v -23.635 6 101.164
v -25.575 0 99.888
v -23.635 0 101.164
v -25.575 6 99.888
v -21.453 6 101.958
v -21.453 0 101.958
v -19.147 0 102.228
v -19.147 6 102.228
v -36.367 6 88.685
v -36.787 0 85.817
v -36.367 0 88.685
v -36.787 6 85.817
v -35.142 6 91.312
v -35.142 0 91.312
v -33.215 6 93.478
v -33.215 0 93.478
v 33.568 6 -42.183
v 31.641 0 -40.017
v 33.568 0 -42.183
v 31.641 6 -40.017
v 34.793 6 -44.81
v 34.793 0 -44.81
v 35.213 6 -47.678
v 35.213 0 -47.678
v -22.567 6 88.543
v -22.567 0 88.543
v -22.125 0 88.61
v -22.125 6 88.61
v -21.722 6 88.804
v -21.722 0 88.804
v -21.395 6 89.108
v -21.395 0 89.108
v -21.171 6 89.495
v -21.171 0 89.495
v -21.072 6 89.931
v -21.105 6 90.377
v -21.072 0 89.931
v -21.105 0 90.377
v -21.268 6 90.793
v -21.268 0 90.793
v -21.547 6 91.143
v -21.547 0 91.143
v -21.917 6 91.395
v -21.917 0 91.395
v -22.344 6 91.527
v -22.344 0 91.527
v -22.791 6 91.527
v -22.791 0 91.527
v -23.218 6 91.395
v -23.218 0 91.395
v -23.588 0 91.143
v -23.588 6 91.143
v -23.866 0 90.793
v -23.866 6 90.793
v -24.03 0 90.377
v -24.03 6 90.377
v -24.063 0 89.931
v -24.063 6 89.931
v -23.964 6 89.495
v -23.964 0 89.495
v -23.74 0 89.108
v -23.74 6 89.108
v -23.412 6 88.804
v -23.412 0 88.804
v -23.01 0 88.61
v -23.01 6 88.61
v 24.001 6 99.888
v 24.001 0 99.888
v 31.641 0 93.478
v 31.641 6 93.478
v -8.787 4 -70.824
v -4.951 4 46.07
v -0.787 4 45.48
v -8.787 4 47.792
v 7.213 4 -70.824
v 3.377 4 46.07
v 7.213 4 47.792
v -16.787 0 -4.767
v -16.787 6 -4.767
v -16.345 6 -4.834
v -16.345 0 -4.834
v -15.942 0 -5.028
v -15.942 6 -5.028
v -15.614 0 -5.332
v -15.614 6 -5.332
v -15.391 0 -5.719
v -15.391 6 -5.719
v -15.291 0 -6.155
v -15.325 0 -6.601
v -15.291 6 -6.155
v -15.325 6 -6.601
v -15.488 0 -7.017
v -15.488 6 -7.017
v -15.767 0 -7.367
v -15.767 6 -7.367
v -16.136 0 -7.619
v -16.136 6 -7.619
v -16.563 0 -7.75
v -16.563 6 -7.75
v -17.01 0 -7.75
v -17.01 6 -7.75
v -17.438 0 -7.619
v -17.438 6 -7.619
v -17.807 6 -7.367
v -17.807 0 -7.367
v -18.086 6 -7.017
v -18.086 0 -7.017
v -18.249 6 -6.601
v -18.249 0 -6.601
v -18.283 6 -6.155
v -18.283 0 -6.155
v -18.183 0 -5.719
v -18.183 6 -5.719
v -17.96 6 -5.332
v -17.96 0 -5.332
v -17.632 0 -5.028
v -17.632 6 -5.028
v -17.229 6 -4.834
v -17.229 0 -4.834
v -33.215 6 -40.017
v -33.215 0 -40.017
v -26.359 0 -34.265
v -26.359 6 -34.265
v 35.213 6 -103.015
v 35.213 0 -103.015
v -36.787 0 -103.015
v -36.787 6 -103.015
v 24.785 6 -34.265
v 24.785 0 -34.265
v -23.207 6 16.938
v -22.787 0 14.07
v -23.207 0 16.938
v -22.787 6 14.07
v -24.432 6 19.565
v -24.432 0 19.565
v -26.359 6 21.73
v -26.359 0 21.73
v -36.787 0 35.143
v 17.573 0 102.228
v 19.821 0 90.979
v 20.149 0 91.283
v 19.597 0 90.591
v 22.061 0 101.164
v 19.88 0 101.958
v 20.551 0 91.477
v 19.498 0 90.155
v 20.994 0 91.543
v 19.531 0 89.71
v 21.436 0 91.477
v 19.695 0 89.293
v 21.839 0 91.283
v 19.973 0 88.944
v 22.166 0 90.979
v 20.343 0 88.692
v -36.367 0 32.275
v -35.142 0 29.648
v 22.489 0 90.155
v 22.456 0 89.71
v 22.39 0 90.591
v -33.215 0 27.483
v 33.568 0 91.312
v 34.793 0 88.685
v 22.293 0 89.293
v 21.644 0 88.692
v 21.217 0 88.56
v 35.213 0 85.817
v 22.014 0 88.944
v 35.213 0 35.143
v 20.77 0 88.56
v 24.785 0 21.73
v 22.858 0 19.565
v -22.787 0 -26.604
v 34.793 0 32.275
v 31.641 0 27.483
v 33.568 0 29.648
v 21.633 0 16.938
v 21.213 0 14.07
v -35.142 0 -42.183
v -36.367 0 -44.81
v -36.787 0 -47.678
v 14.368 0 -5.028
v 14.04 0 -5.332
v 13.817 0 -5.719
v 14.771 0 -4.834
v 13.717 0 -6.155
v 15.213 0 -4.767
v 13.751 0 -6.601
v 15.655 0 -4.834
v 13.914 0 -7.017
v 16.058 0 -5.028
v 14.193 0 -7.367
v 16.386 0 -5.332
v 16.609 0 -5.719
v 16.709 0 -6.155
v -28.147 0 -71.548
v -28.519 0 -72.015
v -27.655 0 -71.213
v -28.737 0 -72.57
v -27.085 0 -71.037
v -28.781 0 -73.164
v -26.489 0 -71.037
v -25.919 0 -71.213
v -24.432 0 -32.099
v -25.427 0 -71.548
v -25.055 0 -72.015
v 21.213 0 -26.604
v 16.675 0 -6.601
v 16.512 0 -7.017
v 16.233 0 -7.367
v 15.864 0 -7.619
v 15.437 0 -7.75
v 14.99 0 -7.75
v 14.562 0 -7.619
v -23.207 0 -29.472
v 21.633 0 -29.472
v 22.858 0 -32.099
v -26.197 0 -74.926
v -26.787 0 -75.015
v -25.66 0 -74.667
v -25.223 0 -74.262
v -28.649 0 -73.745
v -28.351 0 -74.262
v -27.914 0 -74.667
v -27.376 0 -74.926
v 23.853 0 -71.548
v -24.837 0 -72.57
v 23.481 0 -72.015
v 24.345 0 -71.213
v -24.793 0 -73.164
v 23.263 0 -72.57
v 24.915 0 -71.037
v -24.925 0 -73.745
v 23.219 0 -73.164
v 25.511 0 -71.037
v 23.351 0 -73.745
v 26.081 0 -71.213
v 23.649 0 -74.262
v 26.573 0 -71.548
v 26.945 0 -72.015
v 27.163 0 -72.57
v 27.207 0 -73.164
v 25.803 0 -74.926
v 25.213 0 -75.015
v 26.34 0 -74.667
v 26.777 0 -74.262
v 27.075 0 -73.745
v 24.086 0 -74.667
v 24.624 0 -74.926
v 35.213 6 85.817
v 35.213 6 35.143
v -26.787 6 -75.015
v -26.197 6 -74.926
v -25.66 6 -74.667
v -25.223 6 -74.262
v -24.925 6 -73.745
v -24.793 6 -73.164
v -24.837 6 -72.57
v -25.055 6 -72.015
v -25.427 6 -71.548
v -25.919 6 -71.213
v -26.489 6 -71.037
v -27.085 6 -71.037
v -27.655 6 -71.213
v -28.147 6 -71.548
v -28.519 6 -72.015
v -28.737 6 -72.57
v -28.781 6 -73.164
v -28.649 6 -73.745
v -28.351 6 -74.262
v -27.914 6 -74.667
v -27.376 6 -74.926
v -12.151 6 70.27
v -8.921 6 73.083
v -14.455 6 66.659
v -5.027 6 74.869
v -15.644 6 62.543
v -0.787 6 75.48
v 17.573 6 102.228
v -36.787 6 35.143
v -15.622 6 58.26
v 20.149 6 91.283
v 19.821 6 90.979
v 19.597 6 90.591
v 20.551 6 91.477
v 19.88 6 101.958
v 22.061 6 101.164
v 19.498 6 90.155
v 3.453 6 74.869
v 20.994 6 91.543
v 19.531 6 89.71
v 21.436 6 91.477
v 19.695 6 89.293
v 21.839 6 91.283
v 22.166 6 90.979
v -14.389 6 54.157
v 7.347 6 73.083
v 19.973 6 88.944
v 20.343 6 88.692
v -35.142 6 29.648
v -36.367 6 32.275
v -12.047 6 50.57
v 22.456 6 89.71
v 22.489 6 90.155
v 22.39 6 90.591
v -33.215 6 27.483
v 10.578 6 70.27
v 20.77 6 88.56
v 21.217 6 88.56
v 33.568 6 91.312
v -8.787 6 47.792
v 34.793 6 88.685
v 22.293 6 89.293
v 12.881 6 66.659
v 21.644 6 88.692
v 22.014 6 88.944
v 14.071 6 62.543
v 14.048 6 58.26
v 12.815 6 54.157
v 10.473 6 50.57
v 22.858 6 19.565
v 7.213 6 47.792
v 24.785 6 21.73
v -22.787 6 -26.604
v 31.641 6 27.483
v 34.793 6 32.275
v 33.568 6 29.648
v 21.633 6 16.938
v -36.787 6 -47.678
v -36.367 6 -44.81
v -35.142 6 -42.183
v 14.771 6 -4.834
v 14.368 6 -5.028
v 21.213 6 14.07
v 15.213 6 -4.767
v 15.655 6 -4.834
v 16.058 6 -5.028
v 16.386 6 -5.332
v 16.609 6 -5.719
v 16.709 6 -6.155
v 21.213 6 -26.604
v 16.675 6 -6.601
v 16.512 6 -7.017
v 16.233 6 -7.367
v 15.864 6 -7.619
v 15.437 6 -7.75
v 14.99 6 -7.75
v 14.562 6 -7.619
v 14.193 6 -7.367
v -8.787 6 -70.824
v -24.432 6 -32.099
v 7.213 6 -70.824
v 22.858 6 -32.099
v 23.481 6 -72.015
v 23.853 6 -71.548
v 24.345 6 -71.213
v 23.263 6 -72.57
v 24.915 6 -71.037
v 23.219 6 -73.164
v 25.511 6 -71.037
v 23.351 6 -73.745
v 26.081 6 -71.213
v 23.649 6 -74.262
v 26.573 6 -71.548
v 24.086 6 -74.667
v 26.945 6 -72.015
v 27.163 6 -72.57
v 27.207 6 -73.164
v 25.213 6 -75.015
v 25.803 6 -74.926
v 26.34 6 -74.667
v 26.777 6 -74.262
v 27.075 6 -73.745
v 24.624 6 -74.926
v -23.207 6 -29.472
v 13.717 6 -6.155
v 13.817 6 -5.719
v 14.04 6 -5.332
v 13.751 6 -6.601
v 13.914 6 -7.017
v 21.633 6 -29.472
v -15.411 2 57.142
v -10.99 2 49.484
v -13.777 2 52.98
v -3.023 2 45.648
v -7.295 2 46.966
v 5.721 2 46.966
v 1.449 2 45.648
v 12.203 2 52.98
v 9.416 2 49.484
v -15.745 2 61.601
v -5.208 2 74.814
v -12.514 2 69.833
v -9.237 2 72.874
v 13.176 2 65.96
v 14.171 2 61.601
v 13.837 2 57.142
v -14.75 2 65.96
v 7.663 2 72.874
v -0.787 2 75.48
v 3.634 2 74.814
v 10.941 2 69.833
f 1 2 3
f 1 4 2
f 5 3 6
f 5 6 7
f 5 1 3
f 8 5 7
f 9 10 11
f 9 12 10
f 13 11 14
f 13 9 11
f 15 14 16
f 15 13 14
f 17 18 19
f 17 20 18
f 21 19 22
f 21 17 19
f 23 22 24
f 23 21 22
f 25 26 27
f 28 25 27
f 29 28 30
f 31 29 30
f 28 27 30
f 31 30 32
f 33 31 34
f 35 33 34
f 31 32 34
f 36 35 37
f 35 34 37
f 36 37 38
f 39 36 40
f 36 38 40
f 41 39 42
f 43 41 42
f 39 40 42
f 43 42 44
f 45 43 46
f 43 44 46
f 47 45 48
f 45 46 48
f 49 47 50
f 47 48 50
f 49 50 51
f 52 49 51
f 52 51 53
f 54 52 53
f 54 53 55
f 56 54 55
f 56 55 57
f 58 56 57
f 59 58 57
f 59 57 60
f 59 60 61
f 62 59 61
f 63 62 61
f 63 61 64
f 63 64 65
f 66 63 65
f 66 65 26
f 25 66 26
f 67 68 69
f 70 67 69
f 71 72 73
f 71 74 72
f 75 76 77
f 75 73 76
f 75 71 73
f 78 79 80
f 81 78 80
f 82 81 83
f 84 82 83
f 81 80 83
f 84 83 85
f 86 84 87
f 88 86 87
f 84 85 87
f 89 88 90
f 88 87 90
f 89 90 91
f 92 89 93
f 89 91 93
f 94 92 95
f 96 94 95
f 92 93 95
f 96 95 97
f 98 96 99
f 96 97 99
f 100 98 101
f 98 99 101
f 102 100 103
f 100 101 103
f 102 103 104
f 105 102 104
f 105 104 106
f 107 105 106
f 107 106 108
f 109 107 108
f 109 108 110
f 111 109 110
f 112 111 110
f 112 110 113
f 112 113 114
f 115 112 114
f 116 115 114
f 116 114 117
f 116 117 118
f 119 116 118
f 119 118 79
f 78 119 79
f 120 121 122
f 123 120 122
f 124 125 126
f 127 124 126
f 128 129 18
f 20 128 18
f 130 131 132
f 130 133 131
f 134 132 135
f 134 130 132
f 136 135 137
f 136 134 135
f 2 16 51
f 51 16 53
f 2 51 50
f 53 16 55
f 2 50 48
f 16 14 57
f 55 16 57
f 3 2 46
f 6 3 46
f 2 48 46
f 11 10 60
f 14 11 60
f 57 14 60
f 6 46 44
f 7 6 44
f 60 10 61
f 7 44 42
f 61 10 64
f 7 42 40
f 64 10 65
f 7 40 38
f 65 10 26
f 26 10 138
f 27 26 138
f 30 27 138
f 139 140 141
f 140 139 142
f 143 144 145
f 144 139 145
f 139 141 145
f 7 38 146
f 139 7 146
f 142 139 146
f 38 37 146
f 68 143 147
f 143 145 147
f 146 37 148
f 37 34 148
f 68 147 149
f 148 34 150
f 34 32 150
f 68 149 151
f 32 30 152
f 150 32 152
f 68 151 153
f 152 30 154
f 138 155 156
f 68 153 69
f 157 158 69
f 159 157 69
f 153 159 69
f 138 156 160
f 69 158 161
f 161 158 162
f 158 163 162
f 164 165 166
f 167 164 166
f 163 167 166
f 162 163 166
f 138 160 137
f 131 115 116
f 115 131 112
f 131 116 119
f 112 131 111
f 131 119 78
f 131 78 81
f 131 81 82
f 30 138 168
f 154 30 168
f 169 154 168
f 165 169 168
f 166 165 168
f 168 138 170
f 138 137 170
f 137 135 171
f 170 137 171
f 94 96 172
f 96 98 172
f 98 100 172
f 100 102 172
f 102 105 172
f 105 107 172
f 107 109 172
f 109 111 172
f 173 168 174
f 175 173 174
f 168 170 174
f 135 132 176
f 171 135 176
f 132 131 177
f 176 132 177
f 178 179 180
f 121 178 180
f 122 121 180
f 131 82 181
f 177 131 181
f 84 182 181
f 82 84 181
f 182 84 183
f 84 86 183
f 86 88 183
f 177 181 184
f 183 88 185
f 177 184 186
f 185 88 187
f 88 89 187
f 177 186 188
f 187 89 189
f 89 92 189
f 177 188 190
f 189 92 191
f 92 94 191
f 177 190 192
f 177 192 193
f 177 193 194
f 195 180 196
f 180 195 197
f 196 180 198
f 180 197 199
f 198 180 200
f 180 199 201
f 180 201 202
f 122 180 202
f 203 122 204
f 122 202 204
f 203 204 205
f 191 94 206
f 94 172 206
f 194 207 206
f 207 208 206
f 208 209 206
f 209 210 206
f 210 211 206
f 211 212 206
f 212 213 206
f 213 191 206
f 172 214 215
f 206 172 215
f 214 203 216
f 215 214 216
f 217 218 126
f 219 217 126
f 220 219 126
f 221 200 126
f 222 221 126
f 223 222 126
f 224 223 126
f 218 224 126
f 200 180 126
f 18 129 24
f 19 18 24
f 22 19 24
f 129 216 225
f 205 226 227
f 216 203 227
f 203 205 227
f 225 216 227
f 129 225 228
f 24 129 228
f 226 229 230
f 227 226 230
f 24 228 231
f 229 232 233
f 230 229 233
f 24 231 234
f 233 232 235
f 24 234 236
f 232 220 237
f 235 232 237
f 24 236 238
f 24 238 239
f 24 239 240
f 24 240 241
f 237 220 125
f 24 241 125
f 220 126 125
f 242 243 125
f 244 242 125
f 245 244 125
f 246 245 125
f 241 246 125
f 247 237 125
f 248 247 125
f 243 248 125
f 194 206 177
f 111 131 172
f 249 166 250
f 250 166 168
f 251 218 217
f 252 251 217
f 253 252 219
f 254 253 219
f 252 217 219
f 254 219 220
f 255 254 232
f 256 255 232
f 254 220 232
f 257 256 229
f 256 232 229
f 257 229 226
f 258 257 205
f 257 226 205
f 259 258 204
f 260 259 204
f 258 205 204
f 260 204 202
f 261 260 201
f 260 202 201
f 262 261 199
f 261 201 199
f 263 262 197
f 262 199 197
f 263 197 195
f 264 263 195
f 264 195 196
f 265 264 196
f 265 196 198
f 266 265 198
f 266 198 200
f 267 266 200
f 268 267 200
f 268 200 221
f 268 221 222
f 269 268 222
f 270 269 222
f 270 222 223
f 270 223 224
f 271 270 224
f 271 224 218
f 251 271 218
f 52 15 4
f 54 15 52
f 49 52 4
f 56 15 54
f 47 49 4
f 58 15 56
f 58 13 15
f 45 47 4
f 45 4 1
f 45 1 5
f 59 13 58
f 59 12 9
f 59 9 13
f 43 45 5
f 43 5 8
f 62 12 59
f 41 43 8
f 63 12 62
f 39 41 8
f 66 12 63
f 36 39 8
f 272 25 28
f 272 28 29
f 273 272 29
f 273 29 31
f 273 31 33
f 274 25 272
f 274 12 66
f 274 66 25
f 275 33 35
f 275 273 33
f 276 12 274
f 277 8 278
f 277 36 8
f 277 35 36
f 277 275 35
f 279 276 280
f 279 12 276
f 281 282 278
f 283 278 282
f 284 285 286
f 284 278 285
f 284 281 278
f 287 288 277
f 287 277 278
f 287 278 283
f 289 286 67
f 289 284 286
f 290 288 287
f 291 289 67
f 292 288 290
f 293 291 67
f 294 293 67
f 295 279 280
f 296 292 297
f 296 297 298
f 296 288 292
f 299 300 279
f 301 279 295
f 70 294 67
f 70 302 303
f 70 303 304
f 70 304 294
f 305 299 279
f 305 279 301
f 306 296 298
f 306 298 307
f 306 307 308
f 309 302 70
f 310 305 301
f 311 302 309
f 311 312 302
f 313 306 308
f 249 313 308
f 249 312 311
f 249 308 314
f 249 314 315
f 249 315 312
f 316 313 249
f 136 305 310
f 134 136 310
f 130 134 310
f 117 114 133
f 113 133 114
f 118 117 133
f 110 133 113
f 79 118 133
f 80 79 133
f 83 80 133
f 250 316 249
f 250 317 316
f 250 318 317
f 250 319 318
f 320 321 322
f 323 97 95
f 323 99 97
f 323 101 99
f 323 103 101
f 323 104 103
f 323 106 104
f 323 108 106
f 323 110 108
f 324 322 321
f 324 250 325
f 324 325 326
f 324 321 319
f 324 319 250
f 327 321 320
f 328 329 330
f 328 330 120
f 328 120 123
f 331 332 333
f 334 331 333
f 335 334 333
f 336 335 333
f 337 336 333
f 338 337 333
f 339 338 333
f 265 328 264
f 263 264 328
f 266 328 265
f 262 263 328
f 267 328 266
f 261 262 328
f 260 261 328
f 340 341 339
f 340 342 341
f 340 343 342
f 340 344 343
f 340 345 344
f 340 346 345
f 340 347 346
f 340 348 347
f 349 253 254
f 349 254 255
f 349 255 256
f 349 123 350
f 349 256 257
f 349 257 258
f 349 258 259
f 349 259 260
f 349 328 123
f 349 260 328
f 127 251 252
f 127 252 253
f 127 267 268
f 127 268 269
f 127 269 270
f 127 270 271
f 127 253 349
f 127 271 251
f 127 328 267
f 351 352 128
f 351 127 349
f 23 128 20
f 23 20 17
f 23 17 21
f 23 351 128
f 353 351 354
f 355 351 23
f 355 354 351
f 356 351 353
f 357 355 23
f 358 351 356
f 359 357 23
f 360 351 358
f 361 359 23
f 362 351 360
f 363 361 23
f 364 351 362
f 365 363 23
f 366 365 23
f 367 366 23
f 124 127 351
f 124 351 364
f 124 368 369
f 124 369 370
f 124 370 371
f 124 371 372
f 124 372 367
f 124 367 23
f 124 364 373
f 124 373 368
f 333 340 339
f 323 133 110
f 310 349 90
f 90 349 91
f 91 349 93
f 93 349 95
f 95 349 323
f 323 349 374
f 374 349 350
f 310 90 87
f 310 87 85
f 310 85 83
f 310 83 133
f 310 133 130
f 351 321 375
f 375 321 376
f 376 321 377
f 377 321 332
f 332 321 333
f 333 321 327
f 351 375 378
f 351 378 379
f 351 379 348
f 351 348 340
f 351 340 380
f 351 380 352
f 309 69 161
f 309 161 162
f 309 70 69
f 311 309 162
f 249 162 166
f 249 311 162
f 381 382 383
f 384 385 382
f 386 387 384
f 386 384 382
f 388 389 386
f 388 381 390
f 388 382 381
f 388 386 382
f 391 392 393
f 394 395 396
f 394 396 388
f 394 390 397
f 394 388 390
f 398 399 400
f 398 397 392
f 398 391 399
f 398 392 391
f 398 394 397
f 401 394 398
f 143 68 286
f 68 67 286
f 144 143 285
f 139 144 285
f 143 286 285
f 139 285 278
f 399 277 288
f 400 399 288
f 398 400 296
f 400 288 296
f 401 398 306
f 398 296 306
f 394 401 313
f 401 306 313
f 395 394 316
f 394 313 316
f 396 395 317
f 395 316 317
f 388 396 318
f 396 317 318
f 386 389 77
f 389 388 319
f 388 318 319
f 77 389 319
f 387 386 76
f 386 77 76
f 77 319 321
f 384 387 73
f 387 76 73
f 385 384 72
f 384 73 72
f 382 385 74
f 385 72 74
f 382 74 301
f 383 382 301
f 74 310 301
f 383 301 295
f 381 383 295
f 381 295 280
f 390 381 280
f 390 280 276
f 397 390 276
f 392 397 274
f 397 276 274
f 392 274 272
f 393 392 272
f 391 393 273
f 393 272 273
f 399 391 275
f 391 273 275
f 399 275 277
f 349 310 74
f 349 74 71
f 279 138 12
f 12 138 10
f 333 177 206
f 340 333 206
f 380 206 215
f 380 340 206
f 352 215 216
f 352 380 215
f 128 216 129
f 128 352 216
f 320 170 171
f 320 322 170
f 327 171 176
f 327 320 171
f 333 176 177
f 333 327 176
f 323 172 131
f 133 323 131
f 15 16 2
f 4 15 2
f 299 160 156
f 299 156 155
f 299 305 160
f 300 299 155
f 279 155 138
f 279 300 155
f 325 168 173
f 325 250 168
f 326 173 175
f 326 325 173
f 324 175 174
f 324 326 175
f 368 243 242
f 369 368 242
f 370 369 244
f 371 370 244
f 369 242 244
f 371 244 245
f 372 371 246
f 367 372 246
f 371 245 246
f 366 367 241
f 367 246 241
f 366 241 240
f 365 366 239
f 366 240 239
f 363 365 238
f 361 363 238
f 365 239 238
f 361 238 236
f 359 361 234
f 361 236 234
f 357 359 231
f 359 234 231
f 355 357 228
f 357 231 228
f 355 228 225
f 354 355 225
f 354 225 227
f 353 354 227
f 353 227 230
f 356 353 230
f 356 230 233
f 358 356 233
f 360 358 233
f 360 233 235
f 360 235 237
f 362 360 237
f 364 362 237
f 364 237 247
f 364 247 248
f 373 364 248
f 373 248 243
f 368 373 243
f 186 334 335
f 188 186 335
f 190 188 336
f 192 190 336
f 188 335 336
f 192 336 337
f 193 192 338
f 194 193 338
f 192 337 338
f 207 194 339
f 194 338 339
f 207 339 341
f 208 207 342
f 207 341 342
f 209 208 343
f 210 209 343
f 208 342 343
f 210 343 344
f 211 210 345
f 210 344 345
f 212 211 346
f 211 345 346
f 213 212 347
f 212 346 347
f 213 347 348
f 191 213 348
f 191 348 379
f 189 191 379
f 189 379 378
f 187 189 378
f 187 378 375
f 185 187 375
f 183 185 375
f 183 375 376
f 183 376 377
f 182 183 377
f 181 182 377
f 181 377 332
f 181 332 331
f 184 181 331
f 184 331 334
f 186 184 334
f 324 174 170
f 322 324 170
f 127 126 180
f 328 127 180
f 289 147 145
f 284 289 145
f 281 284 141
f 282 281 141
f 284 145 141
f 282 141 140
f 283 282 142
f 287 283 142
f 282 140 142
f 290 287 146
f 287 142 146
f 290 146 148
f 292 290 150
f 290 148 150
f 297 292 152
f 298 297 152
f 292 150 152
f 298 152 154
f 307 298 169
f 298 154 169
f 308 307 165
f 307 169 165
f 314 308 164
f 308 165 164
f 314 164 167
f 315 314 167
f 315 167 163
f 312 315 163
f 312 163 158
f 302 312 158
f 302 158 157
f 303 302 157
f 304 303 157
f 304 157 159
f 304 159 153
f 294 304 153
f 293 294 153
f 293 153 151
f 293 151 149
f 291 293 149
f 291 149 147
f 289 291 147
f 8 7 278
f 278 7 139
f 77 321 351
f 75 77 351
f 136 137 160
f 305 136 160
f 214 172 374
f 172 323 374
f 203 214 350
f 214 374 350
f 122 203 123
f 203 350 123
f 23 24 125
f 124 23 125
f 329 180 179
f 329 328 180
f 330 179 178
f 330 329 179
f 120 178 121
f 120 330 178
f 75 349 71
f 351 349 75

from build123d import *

# Parameters (mm, degrees)
BOSS_EXTRUDE1_DEPTH = 6
FILLET1_R           = 10
SKETCH2_R           = 2.5
CUT_EXTRUDE1_DEPTH  = 6
SKETCH8_W           = 16
SKETCH8_H           = 121.699623713
CUT_EXTRUDE5_DEPTH  = 2
SKETCH9_R           = 15
CUT_EXTRUDE6_DEPTH  = 4
SKETCH10_R          = 4.460390543
BOSS_EXTRUDE2_DEPTH = 2
FILLET2_R           = 10
SKETCH12_R          = 1.5
CUT_EXTRUDE7_DEPTH  = 10
SKETCH13_R          = 1.5
CUT_EXTRUDE8_DEPTH  = 10
SKETCH14_R          = 2
CUT_EXTRUDE9_DEPTH  = 10


with BuildPart() as part:
    # Sketch1 → Boss-Extrude1 (new body)
    with BuildSketch(Plane(origin=(0, 0, 0), x_dir=(1, 0, 0), z_dir=(0, 1, 0))):
        Polygon((21.213083016, -102.227633762), (35.213083016, -90.480238926), (35.213083016, -30.480238926), (21.213083016, -18.73284409), (21.213083016, 31.26715591), (35.213083016, 43.014550747), (35.213083016, 103.014550747), (-36.786916984, 103.014550747), (-36.786916984, 43.014550747), (-22.786916984, 31.26715591), (-22.786916984, -18.73284409), (-36.786916984, -30.480238926), (-36.786916984, -90.480238926), (-22.786916984, -102.227633762), align=None)
    extrude(amount=BOSS_EXTRUDE1_DEPTH)

    # Fillet1
    fillet1_edges = [part.edges().sort_by_distance(p)[0] for p in [
        (-22.786916984, 3, 102.227633762),
        (-36.786916984, 3, 90.480238926),
        (-36.786916984, 3, 30.480238926),
        (-22.786916984, 3, 18.73284409),
        (21.213083016, 3, 18.73284409),
        (35.213083016, 3, 30.480238926),
        (35.213083016, 3, 90.480238926),
        (21.213083016, 3, 102.227633762),
    ]]
    fillet(fillet1_edges, radius=FILLET1_R)

    # Sketch2 → Cut-Extrude1 (cut)
    with BuildSketch(Plane.XZ):
        with Locations(Location((-0.786916984, 60.480238926, 0), (0, 0, 270))):
            Circle(SKETCH2_R)
    extrude(amount=-CUT_EXTRUDE1_DEPTH, mode=Mode.SUBTRACT)

    # Sketch8 → Cut-Extrude5 (cut)
    with BuildSketch(Plane(origin=(0, 6, 0), x_dir=(1, 0, 0), z_dir=(0, 1, 0))):
        with Locations((-0.786916984, 9.974259286)):
            Rectangle(SKETCH8_W, SKETCH8_H)
    extrude(amount=-CUT_EXTRUDE5_DEPTH, mode=Mode.SUBTRACT)

    # Sketch9 → Cut-Extrude6 (cut)
    with BuildSketch(Plane(origin=(0, 6, 0), x_dir=(1, 0, 0), z_dir=(0, 1, 0))):
        with Locations(Location((-0.786916984, -60.480238926, 0), (0, 0, 270))):
            Circle(SKETCH9_R)
    extrude(amount=-CUT_EXTRUDE6_DEPTH, mode=Mode.SUBTRACT)

    # Sketch10 → Boss-Extrude2 (add)
    with BuildSketch(Plane(origin=(0, 2, 0), x_dir=(1, 0, 0), z_dir=(0, 1, 0))):
        with Locations((-0.786916984, -60.480238926)):
            Circle(SKETCH10_R)
    extrude(amount=-BOSS_EXTRUDE2_DEPTH)

    # Fillet2
    fillet2_edges = [part.edges().sort_by_distance(p)[0] for p in [
        (-22.786916984, 3, -31.26715591),
        (-36.786916984, 3, -43.014550747),
        (35.213083016, 3, -43.014550747),
        (21.213083016, 3, -31.26715591),
    ]]
    fillet(fillet2_edges, radius=FILLET2_R)

    # Sketch12 → Cut-Extrude7 (cut)
    with BuildSketch(Plane(origin=(0, 6, 0), x_dir=(1, 0, 0), z_dir=(0, 1, 0))):
        with Locations(Location((15.213083016, 6.26715591, 0), (0, 0, 270))):
            Circle(SKETCH12_R)
        with Locations(Location((-16.786916984, 6.26715591, 0), (0, 0, 270))):
            Circle(SKETCH12_R)
    extrude(amount=-CUT_EXTRUDE7_DEPTH, mode=Mode.SUBTRACT)

    # Sketch13 → Cut-Extrude8 (cut)
    with BuildSketch(Plane.XZ):
        with Locations(Location((-22.567416075, 90.043344962, 0), (0, 0, 270))):
            Circle(SKETCH13_R)
        with Locations(Location((20.993582106, 90.043344962, 0), (0, 0, 90))):
            Circle(SKETCH13_R)
    extrude(amount=-CUT_EXTRUDE8_DEPTH, mode=Mode.SUBTRACT)

    # Sketch14 → Cut-Extrude9 (cut)
    with BuildSketch(Plane.XZ):
        with Locations(Location((-26.786916984, -73.014550747, 0), (0, 0, 270))):
            Circle(SKETCH14_R)
        with Locations(Location((25.213083016, -73.014550747, 0), (0, 0, 270))):
            Circle(SKETCH14_R)
    extrude(amount=-CUT_EXTRUDE9_DEPTH, mode=Mode.SUBTRACT)


solid = part.part
